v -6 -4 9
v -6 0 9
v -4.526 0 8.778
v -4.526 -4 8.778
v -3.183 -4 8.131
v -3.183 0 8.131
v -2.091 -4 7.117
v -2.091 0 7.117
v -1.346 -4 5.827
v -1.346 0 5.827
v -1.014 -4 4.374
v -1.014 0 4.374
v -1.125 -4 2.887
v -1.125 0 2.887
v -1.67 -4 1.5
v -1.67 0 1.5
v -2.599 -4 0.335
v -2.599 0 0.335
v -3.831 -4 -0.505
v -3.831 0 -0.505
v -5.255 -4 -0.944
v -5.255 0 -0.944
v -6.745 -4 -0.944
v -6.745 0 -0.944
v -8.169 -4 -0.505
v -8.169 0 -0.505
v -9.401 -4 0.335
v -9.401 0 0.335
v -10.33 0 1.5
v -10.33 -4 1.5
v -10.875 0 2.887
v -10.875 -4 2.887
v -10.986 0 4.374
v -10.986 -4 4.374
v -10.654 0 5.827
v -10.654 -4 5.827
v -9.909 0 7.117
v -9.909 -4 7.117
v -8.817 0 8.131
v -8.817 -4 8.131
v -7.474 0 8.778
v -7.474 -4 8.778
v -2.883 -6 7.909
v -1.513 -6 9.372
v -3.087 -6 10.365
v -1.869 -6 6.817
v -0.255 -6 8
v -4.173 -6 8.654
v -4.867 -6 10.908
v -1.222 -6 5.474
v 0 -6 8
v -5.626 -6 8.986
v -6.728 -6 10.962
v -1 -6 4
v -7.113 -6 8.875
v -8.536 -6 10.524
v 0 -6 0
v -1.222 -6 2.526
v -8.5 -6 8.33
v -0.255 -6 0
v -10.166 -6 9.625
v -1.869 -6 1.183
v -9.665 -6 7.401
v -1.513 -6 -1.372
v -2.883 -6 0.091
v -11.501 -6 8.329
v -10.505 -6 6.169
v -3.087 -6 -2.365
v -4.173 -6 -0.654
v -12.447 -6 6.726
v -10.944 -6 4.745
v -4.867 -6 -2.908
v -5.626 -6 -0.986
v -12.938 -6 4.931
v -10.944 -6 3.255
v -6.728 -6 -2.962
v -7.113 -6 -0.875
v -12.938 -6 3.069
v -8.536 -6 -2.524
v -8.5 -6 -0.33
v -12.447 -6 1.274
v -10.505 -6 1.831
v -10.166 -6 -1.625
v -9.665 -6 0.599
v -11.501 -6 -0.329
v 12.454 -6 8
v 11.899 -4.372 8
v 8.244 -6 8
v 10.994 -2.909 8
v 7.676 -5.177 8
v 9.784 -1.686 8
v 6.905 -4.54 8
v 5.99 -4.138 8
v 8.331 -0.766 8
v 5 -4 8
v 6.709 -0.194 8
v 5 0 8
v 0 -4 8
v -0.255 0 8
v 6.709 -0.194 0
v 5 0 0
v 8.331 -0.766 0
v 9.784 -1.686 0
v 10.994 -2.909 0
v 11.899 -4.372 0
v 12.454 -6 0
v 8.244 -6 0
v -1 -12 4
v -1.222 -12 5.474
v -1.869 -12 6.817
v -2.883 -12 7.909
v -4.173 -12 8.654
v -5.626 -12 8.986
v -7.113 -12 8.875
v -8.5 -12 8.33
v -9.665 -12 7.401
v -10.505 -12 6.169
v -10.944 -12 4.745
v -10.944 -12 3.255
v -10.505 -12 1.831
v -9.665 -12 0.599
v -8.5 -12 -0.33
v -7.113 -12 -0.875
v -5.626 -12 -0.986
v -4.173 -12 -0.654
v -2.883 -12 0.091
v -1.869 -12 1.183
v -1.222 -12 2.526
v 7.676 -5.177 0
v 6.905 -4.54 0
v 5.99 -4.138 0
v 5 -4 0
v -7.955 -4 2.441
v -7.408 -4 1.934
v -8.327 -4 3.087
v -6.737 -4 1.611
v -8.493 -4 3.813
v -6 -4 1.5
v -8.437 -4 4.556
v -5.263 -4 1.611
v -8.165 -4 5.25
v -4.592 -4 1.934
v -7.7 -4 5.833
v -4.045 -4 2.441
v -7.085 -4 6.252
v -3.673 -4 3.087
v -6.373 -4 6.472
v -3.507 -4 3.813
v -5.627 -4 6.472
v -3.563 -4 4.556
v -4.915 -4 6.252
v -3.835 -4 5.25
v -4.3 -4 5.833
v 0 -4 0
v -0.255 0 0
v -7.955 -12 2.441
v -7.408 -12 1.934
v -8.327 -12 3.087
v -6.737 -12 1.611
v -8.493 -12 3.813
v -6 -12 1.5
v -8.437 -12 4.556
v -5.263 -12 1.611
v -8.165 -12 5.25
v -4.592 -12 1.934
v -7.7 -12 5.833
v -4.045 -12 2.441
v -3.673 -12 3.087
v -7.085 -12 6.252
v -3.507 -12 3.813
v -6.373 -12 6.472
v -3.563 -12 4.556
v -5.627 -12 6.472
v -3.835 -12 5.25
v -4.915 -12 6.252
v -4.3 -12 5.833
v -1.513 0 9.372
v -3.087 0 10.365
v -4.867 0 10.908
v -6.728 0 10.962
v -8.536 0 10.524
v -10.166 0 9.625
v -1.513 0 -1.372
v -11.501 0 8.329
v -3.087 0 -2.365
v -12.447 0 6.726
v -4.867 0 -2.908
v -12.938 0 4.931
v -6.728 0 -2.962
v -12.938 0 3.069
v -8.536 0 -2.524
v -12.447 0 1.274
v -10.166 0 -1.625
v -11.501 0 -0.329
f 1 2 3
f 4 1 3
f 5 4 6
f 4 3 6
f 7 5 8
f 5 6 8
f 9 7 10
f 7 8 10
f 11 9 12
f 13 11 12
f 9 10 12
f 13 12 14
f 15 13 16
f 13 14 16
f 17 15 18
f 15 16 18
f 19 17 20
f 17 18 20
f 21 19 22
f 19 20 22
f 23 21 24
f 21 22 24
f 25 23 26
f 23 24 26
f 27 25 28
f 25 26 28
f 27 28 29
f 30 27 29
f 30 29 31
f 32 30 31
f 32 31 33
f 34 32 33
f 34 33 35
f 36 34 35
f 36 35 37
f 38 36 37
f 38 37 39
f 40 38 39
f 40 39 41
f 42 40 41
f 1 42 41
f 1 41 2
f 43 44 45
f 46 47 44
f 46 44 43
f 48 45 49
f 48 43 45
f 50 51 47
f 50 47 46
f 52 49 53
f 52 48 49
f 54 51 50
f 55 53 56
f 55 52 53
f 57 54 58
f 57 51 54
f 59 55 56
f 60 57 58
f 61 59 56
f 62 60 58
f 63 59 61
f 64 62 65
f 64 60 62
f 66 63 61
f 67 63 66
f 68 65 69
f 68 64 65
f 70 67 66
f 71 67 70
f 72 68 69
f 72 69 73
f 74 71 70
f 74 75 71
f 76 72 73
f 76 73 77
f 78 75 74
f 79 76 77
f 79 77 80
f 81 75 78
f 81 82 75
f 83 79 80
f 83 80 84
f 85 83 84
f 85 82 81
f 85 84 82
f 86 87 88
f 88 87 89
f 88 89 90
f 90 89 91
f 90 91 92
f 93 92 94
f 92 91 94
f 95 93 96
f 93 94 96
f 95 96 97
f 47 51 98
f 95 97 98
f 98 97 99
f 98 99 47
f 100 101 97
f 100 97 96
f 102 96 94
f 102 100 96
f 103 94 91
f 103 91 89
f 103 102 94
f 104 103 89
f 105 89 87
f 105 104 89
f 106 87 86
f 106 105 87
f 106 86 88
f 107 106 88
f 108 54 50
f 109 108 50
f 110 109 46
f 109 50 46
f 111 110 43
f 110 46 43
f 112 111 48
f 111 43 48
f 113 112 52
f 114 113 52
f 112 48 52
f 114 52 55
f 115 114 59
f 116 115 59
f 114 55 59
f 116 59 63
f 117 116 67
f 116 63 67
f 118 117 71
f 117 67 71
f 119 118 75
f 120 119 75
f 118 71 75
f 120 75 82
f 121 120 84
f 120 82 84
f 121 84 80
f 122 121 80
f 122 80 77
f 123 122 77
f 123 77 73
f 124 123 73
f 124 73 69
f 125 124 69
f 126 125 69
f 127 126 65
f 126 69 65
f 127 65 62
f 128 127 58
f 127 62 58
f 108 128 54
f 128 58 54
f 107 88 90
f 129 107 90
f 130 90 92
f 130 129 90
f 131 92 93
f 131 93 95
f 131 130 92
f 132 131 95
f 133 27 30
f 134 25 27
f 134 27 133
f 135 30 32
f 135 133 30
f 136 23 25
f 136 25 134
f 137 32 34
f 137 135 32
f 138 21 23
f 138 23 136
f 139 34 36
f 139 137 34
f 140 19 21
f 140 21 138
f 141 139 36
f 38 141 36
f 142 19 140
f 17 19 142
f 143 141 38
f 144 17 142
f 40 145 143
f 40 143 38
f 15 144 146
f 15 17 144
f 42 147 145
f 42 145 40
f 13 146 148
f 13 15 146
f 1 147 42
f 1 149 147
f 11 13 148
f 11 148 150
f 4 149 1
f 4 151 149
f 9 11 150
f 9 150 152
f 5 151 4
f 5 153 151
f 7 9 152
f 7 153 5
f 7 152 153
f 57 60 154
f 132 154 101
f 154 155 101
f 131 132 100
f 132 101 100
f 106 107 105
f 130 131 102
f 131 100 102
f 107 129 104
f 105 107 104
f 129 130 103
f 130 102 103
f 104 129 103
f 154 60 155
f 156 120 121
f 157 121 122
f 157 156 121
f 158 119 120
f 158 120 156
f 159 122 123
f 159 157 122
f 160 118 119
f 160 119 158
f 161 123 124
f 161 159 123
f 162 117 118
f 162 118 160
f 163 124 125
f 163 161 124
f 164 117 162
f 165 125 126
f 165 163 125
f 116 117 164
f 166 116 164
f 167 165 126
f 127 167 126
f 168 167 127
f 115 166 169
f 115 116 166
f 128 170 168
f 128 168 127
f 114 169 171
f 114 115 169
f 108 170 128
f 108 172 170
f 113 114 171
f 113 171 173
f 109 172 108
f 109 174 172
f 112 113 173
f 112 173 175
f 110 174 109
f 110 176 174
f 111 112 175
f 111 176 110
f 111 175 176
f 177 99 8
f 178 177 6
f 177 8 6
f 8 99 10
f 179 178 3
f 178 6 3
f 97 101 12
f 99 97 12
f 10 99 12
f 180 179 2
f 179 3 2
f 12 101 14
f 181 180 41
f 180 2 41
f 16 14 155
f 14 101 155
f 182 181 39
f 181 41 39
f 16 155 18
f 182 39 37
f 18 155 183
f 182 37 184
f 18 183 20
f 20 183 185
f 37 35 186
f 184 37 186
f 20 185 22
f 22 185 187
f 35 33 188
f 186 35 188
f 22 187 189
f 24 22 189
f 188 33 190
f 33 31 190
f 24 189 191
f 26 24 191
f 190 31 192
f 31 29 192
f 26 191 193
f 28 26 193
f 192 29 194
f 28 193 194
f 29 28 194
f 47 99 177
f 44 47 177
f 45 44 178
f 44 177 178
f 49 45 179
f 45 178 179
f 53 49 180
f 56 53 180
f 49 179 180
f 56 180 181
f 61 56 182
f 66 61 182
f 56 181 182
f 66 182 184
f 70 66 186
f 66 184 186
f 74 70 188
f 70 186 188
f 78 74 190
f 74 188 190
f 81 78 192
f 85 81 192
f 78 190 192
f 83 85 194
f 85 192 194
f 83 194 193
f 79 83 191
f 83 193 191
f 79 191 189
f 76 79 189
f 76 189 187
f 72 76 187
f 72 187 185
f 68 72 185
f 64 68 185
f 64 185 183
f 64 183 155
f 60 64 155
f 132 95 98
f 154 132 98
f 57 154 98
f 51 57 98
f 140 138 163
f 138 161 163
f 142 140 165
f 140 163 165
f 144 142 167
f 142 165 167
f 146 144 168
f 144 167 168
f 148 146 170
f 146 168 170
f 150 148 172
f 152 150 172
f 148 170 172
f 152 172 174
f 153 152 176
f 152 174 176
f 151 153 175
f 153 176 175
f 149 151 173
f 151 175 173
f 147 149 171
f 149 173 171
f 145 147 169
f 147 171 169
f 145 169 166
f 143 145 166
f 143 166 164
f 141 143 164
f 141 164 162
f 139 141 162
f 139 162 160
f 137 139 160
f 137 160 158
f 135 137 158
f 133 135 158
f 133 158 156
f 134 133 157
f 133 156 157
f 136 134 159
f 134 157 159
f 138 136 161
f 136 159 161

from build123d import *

# Parameters (mm, degrees)
EXTRUDE_1_DEPTH           = 8
EXTRUDE_2_DEPTH           = 6
SKETCH_5_R                = 5
EXTRUDE_3_DEPTH           = 6
HOLE_WIZARD_1_D           = 5
HOLE_WIZARD_1_DEPTH       = 30
HOLE_WIZARD_1_CBORE_D     = 10
HOLE_WIZARD_1_CBORE_DEPTH = 4


with BuildPart() as part:
    # 草图3 → 凸台-拉伸1 (new body)
    with BuildSketch(Plane.XY):
        with BuildLine():
            Line((0, 0), (5, 0))
            ThreePointArc((5, 0), (9.784396345, -1.68635165), (12.453978369, -6))
            Line((12.453978369, -6), (8.243547108, -6))
            ThreePointArc((8.243547108, -6), (6.905295111, -4.540192237), (5, -4))
            Line((5, -4), (0, -4))
            Line((0, -4), (0, 0))
        make_face()
    extrude(amount=EXTRUDE_1_DEPTH)

    # 草图4 → 凸台-拉伸2 (add)
    with BuildSketch(Plane(origin=(0, 0, 0), x_dir=(1, 0, 0), z_dir=(0, 1, 0))):
        with BuildLine():
            Line((-0.255437353, 0), (0, 0))
            Line((0, 0), (0, -8))
            Line((0, -8), (-0.255437353, -8))
            ThreePointArc((-0.255437353, -8), (-13, -4), (-0.255437353, 0))
        make_face()
    extrude(amount=-EXTRUDE_2_DEPTH)

    # 草图5 → 凸台-拉伸3 (add)
    with BuildSketch(Plane.XZ.offset(6)):
        with Locations((-6, 4)):
            Circle(SKETCH_5_R)
    extrude(amount=EXTRUDE_3_DEPTH)

    # 孔1
    with Locations(Plane(origin=(-6, 0, 4), x_dir=(0, 0, 1), z_dir=(0, 1, 0))):
        with Locations((0, 0)):
            CounterBoreHole(HOLE_WIZARD_1_D / 2, HOLE_WIZARD_1_CBORE_D / 2, HOLE_WIZARD_1_CBORE_DEPTH, depth=HOLE_WIZARD_1_DEPTH)


solid = part.part
